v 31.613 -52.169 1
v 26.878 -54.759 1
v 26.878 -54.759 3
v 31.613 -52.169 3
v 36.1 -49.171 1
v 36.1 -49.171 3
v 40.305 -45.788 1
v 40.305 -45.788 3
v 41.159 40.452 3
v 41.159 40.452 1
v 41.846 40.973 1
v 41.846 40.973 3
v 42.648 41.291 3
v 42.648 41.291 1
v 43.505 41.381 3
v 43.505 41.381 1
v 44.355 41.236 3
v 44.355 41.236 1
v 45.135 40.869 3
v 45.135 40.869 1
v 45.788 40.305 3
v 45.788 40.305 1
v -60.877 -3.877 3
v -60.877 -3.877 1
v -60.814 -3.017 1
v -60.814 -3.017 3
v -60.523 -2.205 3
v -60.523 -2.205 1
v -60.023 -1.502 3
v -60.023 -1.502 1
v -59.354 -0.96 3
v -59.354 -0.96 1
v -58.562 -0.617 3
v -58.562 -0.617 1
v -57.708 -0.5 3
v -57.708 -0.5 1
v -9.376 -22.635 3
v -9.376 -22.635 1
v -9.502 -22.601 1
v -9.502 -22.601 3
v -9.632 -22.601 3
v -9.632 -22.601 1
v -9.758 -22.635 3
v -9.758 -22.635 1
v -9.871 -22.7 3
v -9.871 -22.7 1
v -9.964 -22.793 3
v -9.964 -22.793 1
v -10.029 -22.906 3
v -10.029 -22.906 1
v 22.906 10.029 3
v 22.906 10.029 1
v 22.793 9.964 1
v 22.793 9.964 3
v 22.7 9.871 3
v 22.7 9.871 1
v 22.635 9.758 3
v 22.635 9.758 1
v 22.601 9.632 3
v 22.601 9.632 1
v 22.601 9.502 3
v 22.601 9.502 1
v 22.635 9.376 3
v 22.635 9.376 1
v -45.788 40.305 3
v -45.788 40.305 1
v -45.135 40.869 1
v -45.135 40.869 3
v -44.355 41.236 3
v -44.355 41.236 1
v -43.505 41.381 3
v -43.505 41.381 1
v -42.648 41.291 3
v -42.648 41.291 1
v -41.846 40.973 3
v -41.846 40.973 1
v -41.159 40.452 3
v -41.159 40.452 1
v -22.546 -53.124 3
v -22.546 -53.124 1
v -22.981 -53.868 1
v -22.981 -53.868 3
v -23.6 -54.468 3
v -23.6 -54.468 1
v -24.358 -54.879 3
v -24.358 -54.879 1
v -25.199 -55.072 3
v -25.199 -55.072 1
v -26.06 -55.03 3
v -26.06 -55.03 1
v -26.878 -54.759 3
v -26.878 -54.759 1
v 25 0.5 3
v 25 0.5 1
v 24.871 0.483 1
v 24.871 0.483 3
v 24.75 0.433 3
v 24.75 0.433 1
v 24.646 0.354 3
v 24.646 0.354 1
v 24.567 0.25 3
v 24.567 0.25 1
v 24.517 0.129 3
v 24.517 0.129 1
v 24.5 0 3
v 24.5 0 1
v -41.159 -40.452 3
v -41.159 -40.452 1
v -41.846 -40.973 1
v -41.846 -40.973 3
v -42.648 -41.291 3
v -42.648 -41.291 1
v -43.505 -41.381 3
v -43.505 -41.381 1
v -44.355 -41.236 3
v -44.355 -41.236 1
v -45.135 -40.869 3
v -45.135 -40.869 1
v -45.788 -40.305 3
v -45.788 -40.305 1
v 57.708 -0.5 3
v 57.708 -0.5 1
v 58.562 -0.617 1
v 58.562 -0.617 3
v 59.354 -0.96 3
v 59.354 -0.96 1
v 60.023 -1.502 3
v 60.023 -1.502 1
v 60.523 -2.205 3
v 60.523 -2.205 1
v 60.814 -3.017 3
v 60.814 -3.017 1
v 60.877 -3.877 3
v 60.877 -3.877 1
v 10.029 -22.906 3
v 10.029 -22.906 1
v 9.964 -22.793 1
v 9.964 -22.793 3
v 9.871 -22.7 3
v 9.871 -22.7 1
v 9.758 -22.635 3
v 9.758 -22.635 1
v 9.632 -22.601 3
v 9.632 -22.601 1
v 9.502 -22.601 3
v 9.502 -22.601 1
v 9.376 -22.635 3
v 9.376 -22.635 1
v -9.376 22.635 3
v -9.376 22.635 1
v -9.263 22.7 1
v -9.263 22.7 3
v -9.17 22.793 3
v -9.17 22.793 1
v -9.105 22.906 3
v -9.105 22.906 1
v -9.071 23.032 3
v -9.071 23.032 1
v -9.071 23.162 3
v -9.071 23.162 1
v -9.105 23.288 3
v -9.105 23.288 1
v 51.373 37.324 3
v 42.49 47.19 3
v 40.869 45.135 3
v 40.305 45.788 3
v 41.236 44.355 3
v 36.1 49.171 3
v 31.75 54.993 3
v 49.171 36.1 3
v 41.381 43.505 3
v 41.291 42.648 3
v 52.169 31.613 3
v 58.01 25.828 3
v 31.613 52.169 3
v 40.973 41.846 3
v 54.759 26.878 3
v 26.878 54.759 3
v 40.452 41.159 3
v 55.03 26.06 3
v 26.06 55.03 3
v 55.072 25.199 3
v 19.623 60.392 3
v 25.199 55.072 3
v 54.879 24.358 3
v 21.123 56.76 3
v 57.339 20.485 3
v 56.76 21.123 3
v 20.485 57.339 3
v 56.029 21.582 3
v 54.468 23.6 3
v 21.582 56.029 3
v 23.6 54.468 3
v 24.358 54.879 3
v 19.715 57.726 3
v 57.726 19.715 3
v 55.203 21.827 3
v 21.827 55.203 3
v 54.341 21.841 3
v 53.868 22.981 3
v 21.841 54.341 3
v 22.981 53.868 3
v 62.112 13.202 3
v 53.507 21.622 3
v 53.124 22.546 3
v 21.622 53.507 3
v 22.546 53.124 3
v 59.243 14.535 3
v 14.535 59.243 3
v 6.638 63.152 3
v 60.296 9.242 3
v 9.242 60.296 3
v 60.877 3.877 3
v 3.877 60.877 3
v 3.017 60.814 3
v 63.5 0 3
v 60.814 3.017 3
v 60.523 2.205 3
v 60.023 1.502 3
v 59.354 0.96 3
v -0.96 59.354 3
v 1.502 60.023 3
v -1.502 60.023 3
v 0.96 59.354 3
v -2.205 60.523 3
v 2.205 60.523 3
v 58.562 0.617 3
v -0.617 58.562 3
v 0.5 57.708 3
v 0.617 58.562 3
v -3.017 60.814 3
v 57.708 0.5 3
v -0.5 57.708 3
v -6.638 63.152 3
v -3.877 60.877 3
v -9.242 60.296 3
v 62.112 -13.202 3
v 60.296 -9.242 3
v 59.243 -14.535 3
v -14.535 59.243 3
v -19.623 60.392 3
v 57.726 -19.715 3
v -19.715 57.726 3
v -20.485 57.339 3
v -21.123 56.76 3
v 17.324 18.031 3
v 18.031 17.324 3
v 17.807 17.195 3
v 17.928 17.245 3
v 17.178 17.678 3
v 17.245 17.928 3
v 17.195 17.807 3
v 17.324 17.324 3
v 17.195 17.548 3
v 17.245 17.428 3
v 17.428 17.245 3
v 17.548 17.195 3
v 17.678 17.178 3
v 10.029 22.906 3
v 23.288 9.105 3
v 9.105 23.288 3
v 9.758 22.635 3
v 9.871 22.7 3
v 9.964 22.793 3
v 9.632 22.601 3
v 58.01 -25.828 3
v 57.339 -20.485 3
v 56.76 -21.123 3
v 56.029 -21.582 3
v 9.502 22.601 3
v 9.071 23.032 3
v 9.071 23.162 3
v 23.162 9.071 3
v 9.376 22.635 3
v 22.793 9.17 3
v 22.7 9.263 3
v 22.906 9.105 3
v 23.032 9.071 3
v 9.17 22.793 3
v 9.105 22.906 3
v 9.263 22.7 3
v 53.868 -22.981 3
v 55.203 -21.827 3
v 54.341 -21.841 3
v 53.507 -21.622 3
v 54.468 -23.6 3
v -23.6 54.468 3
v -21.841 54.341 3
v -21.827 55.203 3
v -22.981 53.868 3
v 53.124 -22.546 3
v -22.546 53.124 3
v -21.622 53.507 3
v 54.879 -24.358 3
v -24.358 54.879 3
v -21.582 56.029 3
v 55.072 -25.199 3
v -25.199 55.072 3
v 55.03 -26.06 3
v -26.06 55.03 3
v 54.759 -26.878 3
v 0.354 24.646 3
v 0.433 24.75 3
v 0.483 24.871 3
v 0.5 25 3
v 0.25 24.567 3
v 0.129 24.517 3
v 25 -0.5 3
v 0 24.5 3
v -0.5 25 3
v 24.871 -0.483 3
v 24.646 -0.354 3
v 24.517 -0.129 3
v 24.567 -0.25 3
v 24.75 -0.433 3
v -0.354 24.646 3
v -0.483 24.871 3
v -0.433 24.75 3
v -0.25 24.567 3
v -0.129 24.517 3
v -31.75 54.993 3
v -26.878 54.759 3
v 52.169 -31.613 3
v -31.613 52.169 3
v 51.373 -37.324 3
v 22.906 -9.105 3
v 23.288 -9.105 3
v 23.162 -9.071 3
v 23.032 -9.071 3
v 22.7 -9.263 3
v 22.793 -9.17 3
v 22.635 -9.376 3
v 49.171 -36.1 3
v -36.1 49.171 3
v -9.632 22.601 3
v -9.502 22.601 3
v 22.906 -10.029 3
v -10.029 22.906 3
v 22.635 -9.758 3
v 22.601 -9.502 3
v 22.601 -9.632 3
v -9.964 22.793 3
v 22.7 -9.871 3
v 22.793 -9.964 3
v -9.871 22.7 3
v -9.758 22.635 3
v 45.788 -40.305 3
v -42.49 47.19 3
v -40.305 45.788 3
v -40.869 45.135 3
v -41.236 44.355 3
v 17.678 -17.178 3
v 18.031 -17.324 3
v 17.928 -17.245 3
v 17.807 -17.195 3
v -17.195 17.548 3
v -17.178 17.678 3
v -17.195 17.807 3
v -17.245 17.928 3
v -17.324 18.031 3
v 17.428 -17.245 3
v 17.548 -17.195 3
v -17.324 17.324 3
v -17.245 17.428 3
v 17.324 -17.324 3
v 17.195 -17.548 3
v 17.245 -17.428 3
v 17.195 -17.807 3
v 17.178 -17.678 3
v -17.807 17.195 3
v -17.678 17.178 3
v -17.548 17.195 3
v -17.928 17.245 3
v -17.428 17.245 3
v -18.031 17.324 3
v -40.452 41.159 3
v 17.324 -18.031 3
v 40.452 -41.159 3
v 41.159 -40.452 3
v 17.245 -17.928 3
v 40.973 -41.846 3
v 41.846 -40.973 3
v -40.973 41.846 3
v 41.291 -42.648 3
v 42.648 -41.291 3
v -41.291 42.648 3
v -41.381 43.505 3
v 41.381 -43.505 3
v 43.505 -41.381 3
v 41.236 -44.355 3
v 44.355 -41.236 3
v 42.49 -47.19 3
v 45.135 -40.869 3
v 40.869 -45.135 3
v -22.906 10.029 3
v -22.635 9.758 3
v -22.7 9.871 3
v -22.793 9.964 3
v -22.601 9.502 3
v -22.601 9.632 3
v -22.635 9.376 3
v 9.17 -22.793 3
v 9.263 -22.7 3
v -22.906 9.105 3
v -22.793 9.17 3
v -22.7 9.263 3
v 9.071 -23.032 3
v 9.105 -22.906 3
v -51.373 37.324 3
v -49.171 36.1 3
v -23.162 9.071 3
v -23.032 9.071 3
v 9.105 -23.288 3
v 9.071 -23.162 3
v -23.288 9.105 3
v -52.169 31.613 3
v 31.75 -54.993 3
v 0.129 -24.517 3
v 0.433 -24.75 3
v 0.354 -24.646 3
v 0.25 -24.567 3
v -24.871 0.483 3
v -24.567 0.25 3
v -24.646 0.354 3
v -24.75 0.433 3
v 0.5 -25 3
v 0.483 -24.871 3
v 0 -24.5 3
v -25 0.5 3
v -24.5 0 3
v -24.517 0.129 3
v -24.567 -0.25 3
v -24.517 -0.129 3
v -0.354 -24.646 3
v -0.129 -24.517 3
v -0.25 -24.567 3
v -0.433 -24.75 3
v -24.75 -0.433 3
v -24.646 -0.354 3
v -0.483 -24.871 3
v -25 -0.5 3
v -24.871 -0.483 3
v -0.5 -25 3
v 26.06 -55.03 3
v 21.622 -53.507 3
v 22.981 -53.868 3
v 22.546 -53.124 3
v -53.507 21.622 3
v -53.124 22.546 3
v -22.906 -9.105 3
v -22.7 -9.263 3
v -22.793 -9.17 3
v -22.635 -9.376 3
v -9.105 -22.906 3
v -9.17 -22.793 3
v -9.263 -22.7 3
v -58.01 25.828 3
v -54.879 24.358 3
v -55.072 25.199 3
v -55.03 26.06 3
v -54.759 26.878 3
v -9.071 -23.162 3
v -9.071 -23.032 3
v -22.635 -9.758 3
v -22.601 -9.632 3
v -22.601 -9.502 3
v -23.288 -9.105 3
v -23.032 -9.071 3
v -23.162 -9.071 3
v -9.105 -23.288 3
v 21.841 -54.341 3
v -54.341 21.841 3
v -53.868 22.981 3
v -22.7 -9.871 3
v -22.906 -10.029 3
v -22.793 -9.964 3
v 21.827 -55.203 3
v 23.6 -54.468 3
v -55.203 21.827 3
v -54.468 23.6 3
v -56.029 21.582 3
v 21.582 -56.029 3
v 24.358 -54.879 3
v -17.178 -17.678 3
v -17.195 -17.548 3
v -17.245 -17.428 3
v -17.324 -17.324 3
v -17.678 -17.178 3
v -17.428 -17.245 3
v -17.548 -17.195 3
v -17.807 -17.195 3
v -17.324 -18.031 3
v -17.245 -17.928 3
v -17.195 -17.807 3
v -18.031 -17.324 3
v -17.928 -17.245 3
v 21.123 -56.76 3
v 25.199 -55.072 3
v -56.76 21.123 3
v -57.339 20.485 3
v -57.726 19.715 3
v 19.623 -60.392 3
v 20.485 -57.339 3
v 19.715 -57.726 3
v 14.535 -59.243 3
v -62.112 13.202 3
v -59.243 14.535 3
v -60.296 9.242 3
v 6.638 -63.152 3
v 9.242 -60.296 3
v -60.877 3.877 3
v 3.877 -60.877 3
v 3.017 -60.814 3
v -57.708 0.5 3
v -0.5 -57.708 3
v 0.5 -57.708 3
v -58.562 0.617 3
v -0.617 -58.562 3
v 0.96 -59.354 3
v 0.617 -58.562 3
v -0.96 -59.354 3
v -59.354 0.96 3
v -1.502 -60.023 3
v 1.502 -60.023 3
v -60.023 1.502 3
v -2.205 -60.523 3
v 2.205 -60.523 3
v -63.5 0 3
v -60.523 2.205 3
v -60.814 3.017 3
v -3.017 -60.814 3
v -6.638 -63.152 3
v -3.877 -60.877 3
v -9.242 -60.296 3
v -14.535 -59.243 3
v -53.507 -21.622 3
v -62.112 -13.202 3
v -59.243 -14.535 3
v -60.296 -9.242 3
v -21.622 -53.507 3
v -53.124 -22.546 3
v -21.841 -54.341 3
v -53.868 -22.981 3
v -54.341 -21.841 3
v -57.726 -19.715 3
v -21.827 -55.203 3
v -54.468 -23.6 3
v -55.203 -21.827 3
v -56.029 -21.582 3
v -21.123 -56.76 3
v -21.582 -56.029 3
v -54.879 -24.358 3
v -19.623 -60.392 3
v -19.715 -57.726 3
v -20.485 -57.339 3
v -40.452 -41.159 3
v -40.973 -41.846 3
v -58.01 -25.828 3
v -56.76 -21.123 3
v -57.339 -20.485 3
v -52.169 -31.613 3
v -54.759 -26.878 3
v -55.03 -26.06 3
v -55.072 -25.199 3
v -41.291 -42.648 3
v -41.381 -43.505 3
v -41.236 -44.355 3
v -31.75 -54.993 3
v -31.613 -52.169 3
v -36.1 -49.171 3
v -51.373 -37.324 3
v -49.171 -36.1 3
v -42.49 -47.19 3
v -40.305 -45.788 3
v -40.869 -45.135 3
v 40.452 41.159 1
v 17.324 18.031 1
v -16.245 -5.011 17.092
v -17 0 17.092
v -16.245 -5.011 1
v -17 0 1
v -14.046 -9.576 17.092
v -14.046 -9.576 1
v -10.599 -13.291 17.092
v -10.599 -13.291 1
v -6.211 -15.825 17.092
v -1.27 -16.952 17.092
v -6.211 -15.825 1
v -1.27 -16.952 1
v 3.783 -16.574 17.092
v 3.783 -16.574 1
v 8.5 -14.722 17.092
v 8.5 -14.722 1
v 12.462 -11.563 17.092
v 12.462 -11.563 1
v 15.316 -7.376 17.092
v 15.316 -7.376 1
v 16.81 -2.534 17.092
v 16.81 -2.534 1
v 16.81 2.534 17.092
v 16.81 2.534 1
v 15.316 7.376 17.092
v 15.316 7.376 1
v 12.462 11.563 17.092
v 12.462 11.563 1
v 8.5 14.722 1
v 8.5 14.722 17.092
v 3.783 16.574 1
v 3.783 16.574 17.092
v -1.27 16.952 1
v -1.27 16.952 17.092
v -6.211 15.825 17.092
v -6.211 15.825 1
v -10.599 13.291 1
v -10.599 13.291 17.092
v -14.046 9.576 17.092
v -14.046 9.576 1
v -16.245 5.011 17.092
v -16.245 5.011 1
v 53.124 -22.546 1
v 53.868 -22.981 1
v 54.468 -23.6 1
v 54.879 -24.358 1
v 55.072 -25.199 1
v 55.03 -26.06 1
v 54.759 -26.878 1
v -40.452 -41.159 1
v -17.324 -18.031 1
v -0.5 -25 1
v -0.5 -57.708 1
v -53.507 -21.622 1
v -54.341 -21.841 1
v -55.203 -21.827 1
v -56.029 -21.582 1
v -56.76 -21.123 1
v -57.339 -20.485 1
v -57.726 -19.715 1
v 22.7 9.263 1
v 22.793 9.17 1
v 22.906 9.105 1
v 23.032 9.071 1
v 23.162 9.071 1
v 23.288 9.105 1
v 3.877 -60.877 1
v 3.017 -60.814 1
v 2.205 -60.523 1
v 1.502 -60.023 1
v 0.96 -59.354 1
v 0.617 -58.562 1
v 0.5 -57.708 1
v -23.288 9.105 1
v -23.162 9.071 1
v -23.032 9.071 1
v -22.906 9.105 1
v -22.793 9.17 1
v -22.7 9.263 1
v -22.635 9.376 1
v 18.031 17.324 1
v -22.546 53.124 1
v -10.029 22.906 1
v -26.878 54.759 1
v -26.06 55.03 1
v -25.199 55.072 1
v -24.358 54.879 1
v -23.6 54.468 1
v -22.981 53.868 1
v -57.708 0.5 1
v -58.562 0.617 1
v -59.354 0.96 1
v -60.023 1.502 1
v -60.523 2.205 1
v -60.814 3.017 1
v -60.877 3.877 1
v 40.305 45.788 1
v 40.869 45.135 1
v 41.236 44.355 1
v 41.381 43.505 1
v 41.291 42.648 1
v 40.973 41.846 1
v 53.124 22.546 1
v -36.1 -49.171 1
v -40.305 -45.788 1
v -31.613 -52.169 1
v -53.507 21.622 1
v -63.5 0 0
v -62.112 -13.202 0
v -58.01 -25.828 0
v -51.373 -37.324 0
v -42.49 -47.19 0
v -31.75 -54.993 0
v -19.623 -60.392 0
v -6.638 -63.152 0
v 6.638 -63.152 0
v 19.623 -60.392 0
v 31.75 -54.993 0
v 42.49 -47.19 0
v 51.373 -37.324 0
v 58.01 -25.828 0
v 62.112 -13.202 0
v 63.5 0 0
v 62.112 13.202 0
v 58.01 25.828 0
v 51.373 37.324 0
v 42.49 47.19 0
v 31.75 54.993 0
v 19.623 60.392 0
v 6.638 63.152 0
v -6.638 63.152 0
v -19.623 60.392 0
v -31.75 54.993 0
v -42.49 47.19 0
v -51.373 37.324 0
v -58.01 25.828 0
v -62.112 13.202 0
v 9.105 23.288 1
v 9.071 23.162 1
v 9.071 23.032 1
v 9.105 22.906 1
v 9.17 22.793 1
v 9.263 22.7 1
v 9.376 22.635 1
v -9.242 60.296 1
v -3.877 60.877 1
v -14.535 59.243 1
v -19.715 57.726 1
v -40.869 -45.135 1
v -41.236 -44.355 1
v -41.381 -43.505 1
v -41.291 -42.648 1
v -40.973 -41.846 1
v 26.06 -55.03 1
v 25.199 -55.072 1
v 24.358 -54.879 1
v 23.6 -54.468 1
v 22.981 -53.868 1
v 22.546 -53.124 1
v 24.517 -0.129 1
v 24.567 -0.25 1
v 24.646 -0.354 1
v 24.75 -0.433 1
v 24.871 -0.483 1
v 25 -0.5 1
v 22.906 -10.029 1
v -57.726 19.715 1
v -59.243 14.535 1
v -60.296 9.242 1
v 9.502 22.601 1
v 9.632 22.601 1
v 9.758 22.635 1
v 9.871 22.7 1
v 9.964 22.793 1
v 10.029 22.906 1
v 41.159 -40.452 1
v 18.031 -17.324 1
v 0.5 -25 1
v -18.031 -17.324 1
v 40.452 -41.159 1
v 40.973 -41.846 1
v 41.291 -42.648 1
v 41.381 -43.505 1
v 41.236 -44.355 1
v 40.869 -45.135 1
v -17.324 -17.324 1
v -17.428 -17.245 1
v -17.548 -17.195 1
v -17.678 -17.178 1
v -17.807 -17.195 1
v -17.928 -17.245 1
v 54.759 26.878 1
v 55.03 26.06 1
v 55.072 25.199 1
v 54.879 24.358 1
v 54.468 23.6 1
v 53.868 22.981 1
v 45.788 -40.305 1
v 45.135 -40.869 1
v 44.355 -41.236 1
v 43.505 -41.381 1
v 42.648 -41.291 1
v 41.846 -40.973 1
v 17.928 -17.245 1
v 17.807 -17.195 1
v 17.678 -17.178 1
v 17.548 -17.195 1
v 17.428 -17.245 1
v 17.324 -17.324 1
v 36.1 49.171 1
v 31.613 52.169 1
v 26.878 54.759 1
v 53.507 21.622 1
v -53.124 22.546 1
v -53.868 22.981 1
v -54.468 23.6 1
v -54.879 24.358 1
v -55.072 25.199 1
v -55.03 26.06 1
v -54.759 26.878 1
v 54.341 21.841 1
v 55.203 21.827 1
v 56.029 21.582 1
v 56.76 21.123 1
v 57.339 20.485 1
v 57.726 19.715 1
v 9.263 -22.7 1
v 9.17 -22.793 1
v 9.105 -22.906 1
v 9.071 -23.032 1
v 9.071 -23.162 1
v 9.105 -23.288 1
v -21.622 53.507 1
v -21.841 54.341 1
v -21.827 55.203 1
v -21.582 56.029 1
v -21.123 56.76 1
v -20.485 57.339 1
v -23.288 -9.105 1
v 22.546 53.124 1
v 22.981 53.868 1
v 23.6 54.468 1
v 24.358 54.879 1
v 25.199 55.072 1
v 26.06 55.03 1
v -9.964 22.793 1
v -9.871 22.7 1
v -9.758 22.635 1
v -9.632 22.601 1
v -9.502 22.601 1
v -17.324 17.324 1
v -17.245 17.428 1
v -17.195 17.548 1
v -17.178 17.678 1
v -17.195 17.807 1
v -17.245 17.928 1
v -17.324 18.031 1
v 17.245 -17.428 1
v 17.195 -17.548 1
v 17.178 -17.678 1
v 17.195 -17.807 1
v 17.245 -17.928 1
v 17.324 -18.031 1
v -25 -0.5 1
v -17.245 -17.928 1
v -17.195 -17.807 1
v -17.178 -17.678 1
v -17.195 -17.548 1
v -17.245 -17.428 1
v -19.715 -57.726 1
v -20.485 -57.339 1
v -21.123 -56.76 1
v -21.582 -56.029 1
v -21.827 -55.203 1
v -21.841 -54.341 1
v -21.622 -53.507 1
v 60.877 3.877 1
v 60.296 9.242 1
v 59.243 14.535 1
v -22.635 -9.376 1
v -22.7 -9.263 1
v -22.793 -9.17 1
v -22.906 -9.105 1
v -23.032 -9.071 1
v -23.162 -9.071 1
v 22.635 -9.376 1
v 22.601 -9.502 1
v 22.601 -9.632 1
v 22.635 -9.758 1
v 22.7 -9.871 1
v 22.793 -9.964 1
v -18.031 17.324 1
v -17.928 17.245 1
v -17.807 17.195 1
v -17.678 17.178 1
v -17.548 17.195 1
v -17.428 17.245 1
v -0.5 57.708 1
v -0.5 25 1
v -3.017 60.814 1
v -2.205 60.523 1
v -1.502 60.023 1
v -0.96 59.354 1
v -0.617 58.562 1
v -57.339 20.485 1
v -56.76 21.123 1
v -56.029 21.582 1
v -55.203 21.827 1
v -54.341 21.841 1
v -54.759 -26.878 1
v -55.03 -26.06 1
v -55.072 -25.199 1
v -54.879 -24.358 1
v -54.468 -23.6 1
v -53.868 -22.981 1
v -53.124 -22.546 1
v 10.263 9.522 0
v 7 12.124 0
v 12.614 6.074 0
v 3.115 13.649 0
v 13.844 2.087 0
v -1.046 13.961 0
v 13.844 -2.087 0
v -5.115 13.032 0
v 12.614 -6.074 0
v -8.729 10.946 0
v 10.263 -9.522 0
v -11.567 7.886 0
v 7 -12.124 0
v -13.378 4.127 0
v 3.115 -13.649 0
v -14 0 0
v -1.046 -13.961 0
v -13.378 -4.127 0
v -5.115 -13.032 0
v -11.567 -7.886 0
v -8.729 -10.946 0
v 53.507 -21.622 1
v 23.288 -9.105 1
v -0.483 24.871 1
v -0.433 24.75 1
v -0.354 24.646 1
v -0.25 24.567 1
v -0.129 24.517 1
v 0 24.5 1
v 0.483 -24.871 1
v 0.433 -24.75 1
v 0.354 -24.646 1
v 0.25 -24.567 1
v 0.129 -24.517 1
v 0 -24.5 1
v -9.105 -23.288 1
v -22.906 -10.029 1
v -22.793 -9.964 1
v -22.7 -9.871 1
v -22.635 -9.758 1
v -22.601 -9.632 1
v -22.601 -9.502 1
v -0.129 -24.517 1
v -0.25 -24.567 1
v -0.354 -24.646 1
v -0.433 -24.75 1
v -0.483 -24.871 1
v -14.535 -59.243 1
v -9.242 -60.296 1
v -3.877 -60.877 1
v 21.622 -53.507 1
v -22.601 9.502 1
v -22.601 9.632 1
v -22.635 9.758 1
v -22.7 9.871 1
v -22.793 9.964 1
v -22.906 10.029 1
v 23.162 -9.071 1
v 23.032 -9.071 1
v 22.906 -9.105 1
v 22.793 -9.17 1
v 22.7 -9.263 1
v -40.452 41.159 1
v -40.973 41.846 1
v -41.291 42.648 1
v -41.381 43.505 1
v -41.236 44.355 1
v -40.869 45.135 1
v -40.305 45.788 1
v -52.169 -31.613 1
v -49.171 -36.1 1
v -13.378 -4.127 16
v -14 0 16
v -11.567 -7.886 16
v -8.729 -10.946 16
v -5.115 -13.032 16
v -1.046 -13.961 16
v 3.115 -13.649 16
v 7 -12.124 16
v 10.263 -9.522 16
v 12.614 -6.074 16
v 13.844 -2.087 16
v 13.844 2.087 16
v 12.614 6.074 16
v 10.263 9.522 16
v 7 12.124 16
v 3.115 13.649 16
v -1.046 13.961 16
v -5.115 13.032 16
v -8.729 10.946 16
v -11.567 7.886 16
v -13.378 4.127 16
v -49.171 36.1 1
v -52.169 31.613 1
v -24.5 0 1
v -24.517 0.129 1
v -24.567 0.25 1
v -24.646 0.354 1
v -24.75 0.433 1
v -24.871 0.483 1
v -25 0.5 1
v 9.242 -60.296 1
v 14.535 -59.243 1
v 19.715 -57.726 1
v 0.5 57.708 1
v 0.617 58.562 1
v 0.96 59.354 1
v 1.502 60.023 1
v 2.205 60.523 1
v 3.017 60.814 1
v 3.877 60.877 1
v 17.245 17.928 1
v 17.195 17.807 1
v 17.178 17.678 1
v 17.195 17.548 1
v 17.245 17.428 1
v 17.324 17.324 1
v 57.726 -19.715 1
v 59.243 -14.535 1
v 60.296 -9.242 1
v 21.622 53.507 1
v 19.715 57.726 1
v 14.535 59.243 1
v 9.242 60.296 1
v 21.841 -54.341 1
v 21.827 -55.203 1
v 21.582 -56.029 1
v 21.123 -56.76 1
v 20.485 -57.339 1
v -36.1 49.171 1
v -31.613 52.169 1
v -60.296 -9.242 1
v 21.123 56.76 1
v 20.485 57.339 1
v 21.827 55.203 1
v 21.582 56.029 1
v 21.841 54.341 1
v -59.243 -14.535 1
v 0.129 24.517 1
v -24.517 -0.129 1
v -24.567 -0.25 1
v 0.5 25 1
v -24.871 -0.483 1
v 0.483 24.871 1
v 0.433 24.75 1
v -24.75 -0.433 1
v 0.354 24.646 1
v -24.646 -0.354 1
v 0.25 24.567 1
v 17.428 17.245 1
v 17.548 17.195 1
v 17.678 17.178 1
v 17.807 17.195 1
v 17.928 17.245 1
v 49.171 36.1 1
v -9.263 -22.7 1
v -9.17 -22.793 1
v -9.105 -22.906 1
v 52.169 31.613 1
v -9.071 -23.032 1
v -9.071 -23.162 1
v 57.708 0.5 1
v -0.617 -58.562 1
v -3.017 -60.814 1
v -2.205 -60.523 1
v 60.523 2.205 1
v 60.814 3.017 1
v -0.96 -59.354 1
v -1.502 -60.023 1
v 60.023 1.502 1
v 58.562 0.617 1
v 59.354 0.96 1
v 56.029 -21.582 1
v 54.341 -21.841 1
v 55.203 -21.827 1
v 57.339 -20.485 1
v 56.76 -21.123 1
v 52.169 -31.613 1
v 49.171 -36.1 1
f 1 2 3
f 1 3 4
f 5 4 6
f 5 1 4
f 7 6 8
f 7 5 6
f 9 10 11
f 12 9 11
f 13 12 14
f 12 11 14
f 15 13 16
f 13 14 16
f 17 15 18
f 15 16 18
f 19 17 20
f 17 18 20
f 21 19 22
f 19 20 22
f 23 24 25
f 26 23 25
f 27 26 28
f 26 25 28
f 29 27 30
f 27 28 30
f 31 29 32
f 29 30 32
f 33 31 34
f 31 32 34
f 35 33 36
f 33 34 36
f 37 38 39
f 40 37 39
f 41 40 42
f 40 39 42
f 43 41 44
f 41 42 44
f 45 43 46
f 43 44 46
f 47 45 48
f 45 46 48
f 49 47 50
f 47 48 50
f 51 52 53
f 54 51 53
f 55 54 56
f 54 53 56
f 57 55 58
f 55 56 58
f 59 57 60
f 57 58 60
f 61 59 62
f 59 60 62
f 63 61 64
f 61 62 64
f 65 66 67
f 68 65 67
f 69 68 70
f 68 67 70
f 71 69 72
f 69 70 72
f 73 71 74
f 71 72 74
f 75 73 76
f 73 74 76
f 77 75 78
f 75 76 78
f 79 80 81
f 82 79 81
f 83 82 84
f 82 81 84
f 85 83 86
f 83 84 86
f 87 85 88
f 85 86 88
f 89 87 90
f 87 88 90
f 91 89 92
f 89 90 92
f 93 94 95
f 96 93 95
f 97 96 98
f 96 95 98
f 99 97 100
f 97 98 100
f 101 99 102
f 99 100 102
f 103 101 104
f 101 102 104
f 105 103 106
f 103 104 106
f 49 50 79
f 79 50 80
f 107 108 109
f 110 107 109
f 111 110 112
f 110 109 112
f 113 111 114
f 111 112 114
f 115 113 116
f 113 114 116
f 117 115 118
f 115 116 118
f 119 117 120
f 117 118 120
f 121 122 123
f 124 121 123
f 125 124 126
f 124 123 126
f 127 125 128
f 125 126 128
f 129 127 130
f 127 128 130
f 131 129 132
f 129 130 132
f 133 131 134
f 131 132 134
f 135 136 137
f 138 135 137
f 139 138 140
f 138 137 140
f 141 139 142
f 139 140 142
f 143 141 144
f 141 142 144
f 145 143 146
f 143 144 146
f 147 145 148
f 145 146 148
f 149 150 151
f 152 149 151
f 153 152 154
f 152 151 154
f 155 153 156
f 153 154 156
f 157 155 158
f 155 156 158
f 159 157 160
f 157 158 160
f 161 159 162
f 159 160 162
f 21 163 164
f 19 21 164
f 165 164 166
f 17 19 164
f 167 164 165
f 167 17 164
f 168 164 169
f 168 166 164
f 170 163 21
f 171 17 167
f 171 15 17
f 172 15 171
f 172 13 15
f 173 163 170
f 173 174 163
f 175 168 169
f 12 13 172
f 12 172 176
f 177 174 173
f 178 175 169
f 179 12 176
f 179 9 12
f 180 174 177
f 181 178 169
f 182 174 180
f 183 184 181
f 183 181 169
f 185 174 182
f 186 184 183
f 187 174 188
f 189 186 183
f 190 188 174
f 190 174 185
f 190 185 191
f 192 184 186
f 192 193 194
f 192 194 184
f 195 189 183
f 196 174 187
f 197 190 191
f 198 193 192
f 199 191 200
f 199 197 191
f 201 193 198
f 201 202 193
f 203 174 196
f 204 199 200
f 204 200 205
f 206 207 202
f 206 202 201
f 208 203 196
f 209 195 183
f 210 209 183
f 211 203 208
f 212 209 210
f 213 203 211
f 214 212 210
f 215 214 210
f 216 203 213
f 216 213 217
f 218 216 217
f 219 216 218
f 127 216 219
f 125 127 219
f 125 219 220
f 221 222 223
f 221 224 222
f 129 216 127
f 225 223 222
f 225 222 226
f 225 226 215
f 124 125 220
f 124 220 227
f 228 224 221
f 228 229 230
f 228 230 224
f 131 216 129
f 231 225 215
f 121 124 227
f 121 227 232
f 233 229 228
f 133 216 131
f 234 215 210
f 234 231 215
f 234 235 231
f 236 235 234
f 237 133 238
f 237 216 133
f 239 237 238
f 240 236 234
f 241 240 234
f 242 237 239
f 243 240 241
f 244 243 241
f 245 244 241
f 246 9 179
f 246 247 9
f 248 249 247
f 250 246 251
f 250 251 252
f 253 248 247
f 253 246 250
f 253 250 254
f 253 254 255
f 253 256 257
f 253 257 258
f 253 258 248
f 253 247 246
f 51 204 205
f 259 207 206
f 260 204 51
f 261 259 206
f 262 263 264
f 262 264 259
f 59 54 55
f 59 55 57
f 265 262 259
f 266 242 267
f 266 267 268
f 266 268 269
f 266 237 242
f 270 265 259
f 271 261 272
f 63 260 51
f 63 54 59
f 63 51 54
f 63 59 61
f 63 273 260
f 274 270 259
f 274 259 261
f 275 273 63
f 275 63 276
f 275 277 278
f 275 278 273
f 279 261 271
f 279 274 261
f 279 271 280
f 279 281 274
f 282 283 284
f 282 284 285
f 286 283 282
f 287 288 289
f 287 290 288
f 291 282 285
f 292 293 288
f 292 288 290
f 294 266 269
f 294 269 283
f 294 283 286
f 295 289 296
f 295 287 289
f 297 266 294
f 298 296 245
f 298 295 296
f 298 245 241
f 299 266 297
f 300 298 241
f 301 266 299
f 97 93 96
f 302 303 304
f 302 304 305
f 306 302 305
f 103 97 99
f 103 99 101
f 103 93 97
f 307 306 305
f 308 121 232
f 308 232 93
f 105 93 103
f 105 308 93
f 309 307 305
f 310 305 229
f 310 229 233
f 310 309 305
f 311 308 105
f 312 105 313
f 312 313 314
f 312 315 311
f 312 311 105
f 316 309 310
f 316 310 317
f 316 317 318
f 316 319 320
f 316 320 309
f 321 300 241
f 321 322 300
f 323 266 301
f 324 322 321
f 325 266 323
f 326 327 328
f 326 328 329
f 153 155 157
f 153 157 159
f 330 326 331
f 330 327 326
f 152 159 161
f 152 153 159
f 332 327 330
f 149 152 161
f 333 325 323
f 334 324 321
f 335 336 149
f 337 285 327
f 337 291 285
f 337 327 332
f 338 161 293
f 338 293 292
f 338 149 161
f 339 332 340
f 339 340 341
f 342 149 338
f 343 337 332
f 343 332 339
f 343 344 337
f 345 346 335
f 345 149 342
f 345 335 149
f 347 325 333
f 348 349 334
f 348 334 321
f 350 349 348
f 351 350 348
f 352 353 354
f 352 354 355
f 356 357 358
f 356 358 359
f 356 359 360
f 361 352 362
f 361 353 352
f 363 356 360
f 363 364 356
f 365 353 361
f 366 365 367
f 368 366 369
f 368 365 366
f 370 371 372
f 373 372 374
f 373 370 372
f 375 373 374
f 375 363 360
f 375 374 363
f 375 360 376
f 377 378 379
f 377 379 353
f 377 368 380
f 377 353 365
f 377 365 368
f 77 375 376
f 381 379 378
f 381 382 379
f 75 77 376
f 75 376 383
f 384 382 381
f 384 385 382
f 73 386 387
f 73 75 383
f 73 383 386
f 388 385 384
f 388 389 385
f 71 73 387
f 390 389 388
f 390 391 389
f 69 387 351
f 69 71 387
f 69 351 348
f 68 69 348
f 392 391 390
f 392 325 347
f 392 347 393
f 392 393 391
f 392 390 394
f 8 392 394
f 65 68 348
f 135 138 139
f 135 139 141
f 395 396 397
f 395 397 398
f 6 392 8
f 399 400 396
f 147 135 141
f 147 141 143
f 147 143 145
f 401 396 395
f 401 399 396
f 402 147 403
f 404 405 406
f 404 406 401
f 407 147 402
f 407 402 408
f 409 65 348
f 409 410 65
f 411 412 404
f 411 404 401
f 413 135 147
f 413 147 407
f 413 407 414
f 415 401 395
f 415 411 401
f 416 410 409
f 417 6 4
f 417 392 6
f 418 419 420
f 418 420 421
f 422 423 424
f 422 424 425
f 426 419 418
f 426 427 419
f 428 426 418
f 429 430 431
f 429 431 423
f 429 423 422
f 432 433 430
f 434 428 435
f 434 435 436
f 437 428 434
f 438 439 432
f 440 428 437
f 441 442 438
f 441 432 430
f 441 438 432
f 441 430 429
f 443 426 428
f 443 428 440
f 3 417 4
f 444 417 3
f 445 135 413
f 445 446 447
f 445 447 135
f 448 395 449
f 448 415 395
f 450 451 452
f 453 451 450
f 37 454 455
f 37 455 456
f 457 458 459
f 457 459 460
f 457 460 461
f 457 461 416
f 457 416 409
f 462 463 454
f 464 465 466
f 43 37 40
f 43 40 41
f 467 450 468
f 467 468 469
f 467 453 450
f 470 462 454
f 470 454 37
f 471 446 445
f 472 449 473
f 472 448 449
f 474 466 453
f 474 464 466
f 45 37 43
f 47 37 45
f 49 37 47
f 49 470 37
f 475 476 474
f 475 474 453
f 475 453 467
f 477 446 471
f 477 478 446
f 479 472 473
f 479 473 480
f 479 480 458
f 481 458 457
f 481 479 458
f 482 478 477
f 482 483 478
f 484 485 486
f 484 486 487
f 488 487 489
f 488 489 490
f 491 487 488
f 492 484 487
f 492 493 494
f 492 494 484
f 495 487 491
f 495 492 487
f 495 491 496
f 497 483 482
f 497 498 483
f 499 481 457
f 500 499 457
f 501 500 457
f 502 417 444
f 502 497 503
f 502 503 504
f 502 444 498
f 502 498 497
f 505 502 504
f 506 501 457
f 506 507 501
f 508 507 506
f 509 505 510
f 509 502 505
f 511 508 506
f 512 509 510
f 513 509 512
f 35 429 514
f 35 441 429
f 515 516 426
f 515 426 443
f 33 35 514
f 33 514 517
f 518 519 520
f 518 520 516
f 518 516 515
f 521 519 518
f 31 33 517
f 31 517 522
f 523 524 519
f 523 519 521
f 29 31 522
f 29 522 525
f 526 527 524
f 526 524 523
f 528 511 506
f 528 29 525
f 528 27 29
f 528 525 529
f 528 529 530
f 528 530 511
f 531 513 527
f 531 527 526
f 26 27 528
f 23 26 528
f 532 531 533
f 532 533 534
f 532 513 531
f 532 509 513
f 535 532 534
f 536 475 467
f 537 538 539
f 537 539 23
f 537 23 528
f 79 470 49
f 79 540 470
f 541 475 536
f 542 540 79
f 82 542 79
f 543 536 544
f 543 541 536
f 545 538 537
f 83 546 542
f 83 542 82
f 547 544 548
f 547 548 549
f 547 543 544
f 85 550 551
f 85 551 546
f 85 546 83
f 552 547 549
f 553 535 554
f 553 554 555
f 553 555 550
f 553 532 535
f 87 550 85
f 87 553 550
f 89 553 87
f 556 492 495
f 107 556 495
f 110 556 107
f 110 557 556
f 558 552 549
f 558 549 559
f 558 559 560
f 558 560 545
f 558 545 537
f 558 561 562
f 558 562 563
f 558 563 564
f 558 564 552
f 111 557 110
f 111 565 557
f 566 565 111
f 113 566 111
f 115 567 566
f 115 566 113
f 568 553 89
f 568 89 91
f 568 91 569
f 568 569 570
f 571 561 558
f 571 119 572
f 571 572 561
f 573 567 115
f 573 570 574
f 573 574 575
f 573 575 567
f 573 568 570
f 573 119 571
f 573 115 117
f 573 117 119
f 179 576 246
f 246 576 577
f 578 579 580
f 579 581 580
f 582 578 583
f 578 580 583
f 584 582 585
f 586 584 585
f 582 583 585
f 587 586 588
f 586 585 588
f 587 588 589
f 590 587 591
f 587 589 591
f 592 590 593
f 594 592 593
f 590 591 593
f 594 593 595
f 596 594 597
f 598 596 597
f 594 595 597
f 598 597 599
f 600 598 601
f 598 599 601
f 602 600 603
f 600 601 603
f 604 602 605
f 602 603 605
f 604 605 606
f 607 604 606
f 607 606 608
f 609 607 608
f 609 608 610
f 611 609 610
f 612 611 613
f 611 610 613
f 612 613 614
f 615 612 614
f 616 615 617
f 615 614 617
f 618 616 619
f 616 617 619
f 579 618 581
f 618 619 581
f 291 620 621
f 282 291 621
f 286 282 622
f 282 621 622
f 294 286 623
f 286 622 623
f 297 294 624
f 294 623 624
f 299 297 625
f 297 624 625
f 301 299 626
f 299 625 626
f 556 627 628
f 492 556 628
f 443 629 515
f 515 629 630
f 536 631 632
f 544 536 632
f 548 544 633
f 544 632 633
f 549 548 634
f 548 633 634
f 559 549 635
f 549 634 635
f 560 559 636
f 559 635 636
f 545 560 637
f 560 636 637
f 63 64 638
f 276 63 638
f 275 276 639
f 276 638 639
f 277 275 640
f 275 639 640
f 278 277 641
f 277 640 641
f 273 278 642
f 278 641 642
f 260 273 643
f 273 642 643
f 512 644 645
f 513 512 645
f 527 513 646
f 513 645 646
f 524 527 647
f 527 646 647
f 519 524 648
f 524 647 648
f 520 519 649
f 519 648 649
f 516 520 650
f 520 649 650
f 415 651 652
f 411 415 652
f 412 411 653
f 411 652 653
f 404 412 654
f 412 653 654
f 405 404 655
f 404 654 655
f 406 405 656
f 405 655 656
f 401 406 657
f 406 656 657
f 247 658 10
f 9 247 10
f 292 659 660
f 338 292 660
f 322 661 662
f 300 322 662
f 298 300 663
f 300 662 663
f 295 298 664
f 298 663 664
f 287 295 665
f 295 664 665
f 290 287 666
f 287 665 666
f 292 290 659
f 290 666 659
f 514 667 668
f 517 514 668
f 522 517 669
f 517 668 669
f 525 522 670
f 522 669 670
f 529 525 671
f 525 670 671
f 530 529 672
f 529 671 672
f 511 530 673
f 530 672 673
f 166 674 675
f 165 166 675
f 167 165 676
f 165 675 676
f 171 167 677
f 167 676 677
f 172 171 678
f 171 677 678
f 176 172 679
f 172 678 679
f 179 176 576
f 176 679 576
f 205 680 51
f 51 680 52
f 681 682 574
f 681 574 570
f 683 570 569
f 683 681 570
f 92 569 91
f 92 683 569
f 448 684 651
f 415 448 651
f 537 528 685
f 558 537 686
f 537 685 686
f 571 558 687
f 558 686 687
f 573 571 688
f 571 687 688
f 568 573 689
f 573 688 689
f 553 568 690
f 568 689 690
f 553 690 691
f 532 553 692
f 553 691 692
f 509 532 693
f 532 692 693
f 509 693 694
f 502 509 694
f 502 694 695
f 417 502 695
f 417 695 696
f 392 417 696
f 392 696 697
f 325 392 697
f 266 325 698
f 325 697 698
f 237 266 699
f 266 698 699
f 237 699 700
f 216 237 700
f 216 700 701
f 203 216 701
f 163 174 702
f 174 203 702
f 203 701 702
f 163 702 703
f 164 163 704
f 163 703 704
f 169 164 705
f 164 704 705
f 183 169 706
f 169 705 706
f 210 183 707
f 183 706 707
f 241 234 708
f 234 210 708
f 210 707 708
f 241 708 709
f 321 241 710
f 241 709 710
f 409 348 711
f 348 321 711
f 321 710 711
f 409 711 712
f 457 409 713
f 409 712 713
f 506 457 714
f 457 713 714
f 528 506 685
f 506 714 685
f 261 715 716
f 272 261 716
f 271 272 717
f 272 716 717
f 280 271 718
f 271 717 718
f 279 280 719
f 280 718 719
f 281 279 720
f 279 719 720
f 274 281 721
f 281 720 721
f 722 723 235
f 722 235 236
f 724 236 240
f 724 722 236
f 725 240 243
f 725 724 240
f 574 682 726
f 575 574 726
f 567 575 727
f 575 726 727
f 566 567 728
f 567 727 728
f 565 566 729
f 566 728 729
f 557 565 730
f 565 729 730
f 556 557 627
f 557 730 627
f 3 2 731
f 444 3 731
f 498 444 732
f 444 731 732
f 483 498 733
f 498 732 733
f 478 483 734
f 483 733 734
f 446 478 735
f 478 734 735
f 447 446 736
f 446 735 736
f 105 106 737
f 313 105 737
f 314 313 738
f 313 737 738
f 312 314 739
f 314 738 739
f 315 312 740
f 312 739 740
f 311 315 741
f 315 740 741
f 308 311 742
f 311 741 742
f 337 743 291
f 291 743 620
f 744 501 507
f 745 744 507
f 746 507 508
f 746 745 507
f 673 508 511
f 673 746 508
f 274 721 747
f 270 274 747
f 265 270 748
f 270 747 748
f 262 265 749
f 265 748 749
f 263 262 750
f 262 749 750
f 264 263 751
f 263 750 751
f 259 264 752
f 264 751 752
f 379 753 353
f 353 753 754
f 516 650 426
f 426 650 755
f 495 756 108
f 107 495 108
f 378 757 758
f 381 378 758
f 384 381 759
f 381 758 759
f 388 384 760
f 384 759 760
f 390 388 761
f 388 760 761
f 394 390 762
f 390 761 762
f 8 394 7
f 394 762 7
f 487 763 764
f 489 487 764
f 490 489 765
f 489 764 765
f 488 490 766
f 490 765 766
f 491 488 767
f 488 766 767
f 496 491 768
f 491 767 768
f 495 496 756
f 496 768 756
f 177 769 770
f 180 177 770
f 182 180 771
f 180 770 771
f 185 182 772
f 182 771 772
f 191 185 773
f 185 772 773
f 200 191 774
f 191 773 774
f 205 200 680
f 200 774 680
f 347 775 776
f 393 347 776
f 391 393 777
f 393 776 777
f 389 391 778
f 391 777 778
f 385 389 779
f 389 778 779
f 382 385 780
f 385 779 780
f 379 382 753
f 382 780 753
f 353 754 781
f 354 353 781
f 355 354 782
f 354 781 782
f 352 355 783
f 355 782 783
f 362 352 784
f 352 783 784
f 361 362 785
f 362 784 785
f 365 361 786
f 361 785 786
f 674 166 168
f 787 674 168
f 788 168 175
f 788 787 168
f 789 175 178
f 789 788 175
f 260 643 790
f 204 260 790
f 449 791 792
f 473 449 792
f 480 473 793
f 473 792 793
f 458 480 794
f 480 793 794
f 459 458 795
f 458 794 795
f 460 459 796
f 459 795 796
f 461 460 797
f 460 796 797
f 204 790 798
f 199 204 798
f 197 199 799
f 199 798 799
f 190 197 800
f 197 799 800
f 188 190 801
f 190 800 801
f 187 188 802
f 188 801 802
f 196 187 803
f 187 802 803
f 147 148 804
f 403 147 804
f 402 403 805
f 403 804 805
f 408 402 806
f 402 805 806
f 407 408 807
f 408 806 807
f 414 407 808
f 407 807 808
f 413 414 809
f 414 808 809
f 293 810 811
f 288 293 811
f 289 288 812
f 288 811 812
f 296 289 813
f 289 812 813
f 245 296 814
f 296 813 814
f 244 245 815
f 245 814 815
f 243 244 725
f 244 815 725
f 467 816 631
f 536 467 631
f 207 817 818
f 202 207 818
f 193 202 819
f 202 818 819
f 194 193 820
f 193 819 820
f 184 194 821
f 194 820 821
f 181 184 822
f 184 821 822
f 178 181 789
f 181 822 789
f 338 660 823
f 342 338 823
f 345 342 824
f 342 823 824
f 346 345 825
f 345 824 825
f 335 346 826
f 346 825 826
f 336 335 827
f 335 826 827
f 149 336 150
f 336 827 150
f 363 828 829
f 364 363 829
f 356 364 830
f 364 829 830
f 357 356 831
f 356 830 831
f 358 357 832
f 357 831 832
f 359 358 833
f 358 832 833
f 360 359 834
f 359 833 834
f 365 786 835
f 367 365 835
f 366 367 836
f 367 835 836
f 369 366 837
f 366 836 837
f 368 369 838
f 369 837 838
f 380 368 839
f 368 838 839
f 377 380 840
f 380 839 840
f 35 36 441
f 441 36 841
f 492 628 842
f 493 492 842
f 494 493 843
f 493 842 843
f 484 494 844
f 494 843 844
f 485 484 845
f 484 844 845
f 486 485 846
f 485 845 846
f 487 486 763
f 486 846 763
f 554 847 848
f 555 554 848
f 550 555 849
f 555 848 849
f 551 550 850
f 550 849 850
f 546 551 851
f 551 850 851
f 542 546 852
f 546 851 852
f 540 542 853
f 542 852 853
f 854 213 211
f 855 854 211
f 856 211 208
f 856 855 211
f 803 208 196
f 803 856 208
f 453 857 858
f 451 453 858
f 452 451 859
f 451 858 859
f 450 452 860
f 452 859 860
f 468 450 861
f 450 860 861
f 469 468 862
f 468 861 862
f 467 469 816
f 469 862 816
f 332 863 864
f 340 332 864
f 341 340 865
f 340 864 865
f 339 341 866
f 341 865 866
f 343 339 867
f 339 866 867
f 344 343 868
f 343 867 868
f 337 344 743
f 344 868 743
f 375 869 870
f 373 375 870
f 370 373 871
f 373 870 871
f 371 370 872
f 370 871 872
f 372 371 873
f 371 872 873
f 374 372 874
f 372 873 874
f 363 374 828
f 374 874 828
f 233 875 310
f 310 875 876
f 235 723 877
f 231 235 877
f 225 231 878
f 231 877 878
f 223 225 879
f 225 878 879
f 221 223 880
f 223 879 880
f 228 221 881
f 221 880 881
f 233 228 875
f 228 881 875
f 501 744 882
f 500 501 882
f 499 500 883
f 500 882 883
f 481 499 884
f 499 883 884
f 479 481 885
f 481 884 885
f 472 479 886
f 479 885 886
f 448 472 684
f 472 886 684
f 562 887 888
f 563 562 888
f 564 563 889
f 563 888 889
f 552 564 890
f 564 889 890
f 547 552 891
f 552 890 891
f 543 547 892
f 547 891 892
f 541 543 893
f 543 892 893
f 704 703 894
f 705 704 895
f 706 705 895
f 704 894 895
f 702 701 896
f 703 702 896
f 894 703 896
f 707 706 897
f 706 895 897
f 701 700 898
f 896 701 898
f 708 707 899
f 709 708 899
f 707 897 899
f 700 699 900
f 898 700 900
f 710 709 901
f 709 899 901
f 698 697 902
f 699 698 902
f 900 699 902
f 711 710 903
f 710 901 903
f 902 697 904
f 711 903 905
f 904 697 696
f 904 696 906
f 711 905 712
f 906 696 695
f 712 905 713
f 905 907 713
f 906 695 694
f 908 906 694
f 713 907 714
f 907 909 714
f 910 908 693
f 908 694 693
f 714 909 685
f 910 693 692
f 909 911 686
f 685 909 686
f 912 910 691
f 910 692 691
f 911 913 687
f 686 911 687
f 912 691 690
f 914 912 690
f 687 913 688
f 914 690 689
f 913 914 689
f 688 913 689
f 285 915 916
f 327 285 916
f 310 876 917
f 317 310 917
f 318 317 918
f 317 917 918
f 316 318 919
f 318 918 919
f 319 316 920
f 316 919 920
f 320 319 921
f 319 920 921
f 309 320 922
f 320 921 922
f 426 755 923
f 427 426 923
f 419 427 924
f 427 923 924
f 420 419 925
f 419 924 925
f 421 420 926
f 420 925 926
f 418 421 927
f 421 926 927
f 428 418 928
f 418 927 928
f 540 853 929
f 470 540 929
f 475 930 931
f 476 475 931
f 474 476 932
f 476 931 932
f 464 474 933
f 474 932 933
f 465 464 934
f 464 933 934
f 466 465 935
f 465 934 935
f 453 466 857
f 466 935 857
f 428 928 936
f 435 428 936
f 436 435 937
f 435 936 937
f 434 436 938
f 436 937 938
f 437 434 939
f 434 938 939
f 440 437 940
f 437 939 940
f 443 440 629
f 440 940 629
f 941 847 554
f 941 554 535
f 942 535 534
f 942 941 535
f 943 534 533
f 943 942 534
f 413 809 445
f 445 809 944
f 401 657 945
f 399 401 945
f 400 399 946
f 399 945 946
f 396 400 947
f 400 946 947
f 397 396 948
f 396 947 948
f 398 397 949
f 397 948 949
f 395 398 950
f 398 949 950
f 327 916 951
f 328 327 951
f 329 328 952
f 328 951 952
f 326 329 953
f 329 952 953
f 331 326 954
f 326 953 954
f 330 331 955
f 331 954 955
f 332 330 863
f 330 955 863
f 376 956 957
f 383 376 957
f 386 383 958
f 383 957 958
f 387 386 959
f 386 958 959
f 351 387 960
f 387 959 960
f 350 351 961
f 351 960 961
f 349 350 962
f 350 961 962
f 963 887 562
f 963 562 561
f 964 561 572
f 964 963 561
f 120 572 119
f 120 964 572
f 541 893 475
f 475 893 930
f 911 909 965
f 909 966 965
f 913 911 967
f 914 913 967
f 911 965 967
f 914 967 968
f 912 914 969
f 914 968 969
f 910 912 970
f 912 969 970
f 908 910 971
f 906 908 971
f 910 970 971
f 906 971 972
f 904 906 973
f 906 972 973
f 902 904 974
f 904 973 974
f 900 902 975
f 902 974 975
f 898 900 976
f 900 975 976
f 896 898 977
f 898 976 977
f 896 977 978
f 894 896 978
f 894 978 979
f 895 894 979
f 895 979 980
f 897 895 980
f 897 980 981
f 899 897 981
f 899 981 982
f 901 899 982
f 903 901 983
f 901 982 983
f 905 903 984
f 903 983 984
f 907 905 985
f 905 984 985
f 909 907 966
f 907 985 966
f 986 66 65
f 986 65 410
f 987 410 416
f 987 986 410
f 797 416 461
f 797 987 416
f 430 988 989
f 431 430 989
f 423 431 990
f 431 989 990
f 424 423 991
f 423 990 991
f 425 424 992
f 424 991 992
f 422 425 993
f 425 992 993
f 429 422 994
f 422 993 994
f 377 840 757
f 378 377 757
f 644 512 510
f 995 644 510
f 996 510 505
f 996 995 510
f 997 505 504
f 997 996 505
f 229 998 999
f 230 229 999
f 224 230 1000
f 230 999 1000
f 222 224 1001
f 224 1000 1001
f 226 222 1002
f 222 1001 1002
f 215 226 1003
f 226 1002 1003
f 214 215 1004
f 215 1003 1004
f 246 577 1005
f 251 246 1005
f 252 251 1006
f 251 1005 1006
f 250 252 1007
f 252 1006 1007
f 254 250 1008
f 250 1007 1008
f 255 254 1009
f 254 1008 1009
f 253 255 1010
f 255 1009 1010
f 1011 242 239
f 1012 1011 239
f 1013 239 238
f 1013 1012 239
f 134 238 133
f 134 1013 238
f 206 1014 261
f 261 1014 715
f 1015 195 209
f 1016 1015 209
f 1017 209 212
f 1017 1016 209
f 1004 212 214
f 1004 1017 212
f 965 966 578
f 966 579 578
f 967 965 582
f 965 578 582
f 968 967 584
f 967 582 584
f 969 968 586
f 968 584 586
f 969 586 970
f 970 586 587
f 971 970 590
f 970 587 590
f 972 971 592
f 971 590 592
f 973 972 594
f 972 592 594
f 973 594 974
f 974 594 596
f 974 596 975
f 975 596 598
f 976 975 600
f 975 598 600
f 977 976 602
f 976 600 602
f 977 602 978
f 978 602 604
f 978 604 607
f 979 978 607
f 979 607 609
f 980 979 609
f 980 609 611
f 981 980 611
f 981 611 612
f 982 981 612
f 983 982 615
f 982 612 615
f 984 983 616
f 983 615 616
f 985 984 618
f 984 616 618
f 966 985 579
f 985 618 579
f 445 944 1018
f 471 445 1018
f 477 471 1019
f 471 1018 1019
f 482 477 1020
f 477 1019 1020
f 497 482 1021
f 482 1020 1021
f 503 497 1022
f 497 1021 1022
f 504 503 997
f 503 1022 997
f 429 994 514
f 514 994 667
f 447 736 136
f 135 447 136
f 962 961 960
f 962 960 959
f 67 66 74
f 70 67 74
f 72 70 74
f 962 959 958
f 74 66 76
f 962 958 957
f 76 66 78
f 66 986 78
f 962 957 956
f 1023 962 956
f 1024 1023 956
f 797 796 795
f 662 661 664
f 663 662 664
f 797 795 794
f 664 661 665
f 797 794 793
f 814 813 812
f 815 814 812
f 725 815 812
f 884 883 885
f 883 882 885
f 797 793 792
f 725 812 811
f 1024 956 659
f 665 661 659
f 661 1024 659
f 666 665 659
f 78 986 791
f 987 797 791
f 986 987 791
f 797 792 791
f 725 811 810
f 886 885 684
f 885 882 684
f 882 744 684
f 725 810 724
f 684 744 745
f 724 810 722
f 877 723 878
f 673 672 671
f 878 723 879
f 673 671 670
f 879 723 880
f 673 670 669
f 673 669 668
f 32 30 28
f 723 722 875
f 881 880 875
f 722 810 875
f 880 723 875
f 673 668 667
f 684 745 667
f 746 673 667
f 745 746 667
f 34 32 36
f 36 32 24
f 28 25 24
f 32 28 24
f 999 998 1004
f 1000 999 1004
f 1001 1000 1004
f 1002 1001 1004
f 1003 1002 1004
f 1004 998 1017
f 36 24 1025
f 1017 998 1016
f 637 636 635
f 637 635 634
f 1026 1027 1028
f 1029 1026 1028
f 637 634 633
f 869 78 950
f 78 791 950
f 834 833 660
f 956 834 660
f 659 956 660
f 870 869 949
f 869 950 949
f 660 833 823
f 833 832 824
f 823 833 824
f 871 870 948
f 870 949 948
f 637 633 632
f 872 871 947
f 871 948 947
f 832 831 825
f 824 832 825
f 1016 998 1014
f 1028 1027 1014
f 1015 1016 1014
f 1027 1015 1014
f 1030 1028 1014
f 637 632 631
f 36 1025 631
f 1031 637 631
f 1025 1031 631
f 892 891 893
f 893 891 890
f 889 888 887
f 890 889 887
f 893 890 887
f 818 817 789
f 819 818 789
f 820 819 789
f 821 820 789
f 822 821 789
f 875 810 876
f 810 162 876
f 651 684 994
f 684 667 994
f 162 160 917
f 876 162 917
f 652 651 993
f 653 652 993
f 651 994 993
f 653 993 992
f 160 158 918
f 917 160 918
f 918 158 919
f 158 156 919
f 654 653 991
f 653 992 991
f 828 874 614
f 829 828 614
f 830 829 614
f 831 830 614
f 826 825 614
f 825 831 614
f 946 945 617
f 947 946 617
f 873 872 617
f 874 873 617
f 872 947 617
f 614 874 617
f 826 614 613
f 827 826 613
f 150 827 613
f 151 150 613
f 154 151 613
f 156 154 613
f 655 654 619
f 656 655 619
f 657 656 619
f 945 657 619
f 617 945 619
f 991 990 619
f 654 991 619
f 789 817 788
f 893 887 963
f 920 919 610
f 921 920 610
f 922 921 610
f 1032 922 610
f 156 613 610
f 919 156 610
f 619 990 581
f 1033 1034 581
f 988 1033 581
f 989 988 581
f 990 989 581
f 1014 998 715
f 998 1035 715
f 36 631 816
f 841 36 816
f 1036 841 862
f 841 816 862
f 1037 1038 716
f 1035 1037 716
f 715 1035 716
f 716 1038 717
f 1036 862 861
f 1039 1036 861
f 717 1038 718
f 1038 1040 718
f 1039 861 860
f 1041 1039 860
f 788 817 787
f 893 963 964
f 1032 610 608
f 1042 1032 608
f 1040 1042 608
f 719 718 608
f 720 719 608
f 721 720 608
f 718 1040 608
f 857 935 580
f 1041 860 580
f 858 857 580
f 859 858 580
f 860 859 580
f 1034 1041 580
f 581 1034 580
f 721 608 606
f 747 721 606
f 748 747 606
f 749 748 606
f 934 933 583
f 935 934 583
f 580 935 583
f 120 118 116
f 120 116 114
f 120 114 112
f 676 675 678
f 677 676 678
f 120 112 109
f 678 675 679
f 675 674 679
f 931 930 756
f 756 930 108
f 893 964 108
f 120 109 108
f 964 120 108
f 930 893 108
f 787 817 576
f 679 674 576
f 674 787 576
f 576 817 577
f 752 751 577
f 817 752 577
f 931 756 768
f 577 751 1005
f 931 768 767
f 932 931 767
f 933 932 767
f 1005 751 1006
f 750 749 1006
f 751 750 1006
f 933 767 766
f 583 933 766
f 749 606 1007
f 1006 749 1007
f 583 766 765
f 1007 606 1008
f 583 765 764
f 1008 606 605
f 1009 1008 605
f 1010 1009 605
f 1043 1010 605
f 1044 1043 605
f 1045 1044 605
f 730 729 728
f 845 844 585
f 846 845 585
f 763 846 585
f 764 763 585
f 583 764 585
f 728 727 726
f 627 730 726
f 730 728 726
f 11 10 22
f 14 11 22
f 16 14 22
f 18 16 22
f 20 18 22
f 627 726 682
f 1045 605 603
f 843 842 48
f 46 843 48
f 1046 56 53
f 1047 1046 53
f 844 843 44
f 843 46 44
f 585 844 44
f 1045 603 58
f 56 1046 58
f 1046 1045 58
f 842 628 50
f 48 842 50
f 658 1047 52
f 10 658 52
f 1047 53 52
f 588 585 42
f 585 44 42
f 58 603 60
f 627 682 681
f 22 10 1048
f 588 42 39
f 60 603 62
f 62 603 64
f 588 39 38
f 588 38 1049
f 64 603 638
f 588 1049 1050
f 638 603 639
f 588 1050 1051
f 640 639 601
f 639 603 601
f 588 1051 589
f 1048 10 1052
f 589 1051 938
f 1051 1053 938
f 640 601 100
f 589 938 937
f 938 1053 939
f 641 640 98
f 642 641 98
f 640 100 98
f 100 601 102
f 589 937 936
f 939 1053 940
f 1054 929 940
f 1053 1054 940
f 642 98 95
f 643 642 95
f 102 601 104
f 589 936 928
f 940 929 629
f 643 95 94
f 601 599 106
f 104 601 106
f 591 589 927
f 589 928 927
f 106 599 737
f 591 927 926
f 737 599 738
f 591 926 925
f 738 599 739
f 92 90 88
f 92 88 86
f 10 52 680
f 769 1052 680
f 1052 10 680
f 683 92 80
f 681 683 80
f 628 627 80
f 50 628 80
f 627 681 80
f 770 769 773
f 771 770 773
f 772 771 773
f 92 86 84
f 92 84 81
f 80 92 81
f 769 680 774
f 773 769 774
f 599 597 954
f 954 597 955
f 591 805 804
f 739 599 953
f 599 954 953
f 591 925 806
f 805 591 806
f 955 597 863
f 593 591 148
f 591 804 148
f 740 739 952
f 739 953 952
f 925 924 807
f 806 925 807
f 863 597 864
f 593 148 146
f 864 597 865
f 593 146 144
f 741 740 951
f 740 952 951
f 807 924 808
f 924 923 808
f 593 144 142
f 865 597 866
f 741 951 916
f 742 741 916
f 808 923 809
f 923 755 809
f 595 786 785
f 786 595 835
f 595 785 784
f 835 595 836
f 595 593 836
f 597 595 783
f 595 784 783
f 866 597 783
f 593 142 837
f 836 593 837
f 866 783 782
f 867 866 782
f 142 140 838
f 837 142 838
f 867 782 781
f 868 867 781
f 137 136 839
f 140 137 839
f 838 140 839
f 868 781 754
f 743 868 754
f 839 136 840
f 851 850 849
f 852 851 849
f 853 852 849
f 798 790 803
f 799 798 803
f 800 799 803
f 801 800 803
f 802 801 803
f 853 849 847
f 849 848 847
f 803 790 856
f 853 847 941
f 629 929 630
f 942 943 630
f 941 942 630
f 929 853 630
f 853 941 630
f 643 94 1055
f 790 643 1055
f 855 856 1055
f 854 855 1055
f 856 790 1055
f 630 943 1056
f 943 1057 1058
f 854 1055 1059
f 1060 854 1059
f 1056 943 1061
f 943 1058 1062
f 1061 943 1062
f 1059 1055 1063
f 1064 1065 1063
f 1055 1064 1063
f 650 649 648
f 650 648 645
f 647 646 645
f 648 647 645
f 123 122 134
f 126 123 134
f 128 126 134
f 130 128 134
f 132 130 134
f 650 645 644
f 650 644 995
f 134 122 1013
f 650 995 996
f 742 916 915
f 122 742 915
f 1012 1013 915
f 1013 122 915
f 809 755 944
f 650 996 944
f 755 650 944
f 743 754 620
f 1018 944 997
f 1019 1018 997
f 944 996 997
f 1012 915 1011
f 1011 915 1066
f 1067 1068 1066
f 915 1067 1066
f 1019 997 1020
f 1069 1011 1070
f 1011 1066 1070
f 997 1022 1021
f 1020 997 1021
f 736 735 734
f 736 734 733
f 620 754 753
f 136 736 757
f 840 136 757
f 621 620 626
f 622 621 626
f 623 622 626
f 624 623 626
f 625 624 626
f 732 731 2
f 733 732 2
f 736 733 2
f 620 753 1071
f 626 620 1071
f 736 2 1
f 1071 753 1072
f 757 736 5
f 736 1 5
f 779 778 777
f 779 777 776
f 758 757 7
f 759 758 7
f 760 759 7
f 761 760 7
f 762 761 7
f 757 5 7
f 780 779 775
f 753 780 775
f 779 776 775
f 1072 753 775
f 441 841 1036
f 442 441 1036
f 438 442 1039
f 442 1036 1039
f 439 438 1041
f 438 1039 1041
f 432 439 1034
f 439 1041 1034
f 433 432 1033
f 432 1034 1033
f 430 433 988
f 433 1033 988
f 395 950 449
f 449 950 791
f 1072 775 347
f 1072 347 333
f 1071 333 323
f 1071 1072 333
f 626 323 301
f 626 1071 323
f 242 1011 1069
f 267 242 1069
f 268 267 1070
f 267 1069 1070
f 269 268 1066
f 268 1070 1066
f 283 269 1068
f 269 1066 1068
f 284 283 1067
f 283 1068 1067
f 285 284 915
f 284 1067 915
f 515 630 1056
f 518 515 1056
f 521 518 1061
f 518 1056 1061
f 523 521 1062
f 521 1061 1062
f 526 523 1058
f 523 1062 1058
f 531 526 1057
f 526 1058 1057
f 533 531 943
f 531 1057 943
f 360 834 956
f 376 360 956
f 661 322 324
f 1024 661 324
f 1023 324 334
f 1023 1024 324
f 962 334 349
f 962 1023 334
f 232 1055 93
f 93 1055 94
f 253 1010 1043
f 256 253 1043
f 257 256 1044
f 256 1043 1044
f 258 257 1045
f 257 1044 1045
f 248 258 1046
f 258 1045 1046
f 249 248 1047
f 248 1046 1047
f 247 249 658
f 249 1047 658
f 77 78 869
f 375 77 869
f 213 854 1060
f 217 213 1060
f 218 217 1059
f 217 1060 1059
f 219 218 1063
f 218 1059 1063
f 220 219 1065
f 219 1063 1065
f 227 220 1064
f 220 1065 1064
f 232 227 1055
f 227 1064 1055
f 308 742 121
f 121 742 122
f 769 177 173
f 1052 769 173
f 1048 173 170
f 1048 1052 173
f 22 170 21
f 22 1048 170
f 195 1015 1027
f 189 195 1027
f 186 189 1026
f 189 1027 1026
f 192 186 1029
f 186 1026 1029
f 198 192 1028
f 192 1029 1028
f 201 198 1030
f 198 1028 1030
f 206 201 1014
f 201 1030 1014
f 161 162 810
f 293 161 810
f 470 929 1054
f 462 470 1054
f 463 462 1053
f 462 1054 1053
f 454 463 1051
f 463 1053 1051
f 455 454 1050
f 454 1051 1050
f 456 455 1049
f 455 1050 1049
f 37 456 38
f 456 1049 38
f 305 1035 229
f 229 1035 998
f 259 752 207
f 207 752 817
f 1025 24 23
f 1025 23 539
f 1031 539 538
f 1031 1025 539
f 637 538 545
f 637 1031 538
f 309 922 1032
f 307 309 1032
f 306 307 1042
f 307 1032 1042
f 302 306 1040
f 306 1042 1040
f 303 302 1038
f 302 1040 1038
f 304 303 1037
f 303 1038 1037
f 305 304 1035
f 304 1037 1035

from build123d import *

# Parameters (mm, degrees)
SKETCH2_R           = 63.5
SKETCH2_R_2         = 61
BOSS_EXTRUDE1_DEPTH = 2
CIRPATTERN1_COUNT   = 16


with BuildPart() as part:
    # Sketch1 → Revolve1 (revolve)
    with BuildSketch(Plane.YZ, mode=Mode.PRIVATE) as revolve1_sk:
        Polygon((14, 0), (14, 16), (17, 17.091910703), (17, 1), (63.5, 1), (63.5, 0), align=None)
    revolve(revolve1_sk.sketch.rotate(Axis((0, 0, 0), (0, 0, 1)), 90), axis=Axis((0, 0, 0), (0, 0, 1)))

    # Sketch2 → Boss-Extrude1 (add)
    # profile 1 of 5: a face of its own
    with BuildSketch(Plane.XY.offset(1)):
        with Locations(Location((0, 0, 0), (0, 0, 180))):
            Circle(SKETCH2_R)
        Circle(SKETCH2_R_2, mode=Mode.SUBTRACT)
    # profile 2 of 5: a face of its own
    with BuildSketch(Plane.XY.offset(1)):
        with BuildLine():
            Line((-0.5, 57.708101684), (-0.5, 25))
            ThreePointArc((-0.5, 25), (-0.353553391, 24.646446609), (0, 24.5))
            Line((0, 24.5), (0, 61))
            ThreePointArc((0, 61), (-0.2500021, 60.999487694), (-0.5, 60.997950785))
            Line((-0.5, 60.997950785), (-0.5, 57.708101684))
        make_face()
    # profile 3 of 5: a face of its own
    with BuildSketch(Plane.XY.offset(1)):
        with BuildLine():
            ThreePointArc((-3.876783398, 60.876683143), (-1.502448193, 60.023408067), (-0.5, 57.708101684))
            Line((-0.5, 57.708101684), (-0.5, 60.997950785))
            ThreePointArc((-0.5, 60.997950785), (-2.189231529, 60.960702631), (-3.876783398, 60.876683143))
        make_face()
    # profile 4 of 5: a face of its own
    with BuildSketch(Plane.XY.offset(1)):
        with BuildLine():
            ThreePointArc((3.876783398, 60.876683143), (2.189231529, 60.960702631), (0.5, 60.997950785))
            Line((0.5, 60.997950785), (0.5, 57.708101684))
            ThreePointArc((0.5, 57.708101684), (1.502448193, 60.023408067), (3.876783398, 60.876683143))
        make_face()
    # profile 5 of 5: a face of its own
    with BuildSketch(Plane.XY.offset(1)):
        with BuildLine():
            Line((0, 61), (0, 24.5))
            ThreePointArc((0, 24.5), (0.353553391, 24.646446609), (0.5, 25))
            Line((0.5, 25), (0.5, 57.708101684))
            Line((0.5, 57.708101684), (0.5, 60.997950785))
            ThreePointArc((0.5, 60.997950785), (0.2500021, 60.999487694), (0, 61))
        make_face()
    boss_extrude1 = extrude(amount=BOSS_EXTRUDE1_DEPTH)

    # CirPattern1: Boss-Extrude1 ×16 about axis
    cirpattern1_axis = Axis((0, 0, 0), (0, 0, 1))
    for i in range(1, CIRPATTERN1_COUNT):
        add(boss_extrude1.rotate(cirpattern1_axis, i * 360 / CIRPATTERN1_COUNT))


solid = part.part
